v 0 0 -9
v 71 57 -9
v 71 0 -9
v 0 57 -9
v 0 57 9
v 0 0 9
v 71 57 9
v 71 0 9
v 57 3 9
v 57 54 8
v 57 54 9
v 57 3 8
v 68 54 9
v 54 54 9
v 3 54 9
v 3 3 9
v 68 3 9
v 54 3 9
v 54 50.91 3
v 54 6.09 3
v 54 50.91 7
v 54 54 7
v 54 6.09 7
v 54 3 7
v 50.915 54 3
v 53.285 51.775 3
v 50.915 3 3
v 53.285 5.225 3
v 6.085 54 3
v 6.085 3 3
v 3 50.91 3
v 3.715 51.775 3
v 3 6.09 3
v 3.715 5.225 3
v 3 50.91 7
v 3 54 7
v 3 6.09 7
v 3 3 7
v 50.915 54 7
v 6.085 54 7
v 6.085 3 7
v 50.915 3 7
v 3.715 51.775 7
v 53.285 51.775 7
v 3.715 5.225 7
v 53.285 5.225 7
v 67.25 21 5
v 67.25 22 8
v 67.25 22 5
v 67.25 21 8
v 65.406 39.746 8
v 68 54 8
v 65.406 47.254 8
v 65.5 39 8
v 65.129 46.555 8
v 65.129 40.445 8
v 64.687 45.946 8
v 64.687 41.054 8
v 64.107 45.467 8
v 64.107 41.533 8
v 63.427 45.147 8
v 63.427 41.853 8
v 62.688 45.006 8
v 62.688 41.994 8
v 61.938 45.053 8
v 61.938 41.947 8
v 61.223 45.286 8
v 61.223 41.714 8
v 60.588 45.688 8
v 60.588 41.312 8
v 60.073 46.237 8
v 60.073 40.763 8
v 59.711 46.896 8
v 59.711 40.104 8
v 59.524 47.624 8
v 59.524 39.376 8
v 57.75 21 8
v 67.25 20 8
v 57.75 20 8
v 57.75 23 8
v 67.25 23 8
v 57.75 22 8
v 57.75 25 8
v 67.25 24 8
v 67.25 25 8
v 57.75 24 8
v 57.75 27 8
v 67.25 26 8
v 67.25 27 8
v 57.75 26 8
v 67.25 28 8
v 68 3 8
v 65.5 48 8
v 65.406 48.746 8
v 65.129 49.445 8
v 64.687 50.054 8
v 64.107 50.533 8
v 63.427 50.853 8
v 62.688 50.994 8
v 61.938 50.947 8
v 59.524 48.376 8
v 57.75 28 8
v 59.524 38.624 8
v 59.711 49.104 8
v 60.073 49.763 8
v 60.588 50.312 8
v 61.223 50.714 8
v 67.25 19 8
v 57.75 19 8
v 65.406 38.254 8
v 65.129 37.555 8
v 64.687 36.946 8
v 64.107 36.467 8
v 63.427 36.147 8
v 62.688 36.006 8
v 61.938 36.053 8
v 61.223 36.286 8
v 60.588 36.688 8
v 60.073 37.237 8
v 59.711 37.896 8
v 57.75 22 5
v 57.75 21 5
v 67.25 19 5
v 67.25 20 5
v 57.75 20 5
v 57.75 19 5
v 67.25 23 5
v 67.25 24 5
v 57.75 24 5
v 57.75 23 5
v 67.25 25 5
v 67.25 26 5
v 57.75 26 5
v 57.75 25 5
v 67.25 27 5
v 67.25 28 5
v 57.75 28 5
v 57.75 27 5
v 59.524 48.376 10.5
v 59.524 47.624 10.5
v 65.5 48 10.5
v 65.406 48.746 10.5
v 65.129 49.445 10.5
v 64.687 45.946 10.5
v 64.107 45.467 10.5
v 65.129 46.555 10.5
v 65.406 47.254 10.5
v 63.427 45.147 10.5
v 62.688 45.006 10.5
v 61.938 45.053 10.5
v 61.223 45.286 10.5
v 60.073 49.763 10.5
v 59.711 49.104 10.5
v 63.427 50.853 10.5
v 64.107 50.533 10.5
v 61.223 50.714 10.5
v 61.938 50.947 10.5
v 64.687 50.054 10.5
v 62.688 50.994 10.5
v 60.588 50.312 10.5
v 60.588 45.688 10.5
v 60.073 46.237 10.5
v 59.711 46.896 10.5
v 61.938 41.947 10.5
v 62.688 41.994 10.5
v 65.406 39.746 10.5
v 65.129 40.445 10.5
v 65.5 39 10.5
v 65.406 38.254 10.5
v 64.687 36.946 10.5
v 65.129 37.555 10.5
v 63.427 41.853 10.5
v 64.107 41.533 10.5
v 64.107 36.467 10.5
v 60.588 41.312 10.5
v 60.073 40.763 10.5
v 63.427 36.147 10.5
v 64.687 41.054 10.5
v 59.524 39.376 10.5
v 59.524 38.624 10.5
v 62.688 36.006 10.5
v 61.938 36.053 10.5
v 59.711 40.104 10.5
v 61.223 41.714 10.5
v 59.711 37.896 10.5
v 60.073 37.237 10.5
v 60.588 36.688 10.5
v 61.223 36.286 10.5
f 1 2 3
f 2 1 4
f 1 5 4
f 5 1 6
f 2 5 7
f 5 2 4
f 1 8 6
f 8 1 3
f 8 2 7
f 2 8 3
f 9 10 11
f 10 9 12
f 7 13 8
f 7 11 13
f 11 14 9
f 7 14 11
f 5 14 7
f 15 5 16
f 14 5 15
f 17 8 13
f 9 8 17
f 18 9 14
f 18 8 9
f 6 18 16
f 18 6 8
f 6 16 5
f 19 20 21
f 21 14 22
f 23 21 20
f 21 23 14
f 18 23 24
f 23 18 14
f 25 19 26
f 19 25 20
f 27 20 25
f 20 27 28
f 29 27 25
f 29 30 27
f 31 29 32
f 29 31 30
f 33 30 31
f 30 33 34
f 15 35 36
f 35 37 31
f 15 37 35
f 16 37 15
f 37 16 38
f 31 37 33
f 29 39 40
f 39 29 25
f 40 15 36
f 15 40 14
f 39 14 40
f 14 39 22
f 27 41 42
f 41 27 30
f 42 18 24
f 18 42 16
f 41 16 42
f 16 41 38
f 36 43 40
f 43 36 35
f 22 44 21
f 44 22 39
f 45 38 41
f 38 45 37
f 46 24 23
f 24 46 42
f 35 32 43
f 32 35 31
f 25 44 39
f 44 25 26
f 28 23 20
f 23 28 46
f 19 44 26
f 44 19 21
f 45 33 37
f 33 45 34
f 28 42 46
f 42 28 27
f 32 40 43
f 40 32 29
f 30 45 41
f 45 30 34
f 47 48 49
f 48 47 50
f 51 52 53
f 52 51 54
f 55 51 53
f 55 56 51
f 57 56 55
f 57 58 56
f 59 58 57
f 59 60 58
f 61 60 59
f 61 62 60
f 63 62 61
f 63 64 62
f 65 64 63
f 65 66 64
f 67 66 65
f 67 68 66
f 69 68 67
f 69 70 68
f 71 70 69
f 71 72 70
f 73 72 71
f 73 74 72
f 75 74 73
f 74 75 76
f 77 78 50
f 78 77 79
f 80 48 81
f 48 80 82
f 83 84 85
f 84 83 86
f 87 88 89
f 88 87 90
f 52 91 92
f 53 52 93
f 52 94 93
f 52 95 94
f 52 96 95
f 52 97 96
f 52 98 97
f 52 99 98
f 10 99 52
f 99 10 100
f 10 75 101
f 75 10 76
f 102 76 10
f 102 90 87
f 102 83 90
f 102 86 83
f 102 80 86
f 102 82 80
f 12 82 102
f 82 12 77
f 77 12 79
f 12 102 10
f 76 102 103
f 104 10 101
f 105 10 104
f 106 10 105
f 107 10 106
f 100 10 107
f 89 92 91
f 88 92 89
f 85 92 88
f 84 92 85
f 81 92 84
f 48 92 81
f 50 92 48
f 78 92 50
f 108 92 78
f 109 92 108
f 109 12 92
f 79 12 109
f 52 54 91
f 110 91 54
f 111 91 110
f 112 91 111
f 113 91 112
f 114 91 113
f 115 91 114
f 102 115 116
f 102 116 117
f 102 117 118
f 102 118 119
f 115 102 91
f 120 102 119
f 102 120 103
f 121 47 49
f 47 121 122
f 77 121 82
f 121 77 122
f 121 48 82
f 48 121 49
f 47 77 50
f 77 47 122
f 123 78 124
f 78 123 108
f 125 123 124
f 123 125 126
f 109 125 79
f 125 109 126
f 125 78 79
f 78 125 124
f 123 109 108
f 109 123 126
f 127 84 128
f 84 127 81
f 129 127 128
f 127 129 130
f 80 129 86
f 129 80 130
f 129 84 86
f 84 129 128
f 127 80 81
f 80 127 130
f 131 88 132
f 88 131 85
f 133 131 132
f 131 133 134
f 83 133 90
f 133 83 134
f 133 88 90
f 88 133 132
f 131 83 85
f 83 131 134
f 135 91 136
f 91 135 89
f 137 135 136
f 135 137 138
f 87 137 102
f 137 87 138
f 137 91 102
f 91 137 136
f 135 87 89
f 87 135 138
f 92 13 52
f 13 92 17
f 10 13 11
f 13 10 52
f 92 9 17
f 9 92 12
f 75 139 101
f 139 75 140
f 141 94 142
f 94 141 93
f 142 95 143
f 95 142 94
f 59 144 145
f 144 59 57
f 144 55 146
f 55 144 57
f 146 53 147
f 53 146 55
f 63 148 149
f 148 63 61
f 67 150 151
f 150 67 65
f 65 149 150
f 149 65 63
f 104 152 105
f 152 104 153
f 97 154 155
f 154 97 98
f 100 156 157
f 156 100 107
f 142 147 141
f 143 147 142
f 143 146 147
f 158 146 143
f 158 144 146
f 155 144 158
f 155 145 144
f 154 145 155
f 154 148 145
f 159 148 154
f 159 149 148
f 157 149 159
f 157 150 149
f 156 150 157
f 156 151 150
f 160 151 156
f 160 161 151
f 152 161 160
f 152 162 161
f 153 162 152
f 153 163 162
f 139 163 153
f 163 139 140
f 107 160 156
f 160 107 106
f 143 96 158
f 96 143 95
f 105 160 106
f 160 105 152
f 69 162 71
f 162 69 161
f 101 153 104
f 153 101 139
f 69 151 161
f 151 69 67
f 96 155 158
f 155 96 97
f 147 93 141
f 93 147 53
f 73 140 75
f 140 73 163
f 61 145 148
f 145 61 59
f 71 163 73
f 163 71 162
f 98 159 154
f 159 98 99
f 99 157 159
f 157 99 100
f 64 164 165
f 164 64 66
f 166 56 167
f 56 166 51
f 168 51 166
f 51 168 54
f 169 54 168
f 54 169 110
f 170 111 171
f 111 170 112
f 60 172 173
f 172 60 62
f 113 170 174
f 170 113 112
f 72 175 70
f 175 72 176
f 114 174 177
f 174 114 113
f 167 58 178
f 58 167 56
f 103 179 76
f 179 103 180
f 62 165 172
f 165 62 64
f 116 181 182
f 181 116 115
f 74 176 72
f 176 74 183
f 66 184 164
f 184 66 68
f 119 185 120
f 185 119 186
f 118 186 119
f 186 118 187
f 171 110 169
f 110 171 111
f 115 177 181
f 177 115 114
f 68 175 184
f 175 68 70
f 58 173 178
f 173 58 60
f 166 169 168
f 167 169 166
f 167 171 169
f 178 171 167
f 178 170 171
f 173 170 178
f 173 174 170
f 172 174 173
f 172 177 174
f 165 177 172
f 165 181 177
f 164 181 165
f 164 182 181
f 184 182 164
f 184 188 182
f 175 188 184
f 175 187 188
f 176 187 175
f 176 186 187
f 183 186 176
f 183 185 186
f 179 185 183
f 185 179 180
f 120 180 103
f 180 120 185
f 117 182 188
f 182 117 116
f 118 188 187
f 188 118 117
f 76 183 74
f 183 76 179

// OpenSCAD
// TODO: Get actual measurements of the image card.
CARD_LENGTH = 51;
CARD_WIDTH = 51;
CARD_DEPTH = 3;
BORDER = 3;
KNOB_DIAMETER = 3;

difference(){
    
    // Console
    union(){
        cube([CARD_LENGTH+(BORDER*2), CARD_WIDTH+(BORDER*2), CARD_DEPTH*3]);
    
        // This is a lazy way to make it thicker but will work for now
        translate([0,0,-CARD_DEPTH*3]){
            cube([CARD_LENGTH+(BORDER*2), CARD_WIDTH+(BORDER*2), CARD_DEPTH*3]);
            translate([CARD_LENGTH+BORDER,0,0]){
                cube([CARD_LENGTH/3, CARD_WIDTH+(BORDER*2), CARD_DEPTH*3]);
            }
        }
        
        
    }
    
    /*
    // Card opening
    translate([0,BORDER,BORDER]){
        #cube([CARD_LENGTH,CARD_WIDTH,CARD_DEPTH]);
    }
    */
    
    translate([BORDER,BORDER,BORDER]){
    
        // Card cutout
        cube([CARD_LENGTH,CARD_WIDTH,CARD_DEPTH]);

        // Frame cutout
        translate([0,0,CARD_DEPTH]){
            cube([CARD_LENGTH,CARD_WIDTH,CARD_DEPTH*2]);
        }
    }
}

// Frame corners
translate([0,0,CARD_DEPTH]){
    difference(){
        cube([CARD_LENGTH+(BORDER*2), CARD_WIDTH+(BORDER*2), CARD_DEPTH+1]);
        translate([BORDER,BORDER,0]){
            // View cutout
            color("blue"){
                translate([CARD_LENGTH/2,CARD_LENGTH/2,0]){
                    cylinder(r=CARD_LENGTH/1.5,h=CARD_DEPTH+1,$fn=50);
                }
            }
        }
    }
}

// Controls
translate([CARD_LENGTH+BORDER,0,0]){
    difference(){
        cube([CARD_LENGTH/3, CARD_WIDTH+(BORDER*2), CARD_DEPTH*3]);
        
        // Frame cutout
        translate([BORDER,BORDER,(CARD_DEPTH*2)+BORDER-1]){
            cube([(CARD_LENGTH/3)-(BORDER*2),CARD_WIDTH,CARD_DEPTH]);
            
            // Speaker grille
            translate([(((CARD_LENGTH/3)-(BORDER*2))/2)-(((CARD_LENGTH/3)-BORDER*2.5)/2),(CARD_WIDTH-BORDER)-(KNOB_DIAMETER*8),-BORDER]){
                #cube([(CARD_LENGTH/3)-BORDER*2.5,1,BORDER]);
                translate([0,-2,0]){
                    #cube([(CARD_LENGTH/3)-BORDER*2.5,1,BORDER]);
                    translate([0,-2,0]){
                        #cube([(CARD_LENGTH/3)-BORDER*2.5,1,BORDER]);
                        translate([0,-2,0]){
                            #cube([(CARD_LENGTH/3)-BORDER*2.5,1,BORDER]);
                            translate([0,-2,0]){
                                #cube([(CARD_LENGTH/3)-BORDER*2.5,1,BORDER]);
                            }
                        }
                    }
                }
            }
        }
    }
    
    // Knobs
    translate([BORDER+((CARD_LENGTH/3)/2)-KNOB_DIAMETER,(CARD_WIDTH-BORDER),(CARD_DEPTH*2)+BORDER-1.5]){
        cylinder(r=KNOB_DIAMETER,h=BORDER,$fn=25);
        translate([0,-KNOB_DIAMETER*3,0]){
            cylinder(r=KNOB_DIAMETER,h=BORDER,$fn=25);
        }
    }
}
